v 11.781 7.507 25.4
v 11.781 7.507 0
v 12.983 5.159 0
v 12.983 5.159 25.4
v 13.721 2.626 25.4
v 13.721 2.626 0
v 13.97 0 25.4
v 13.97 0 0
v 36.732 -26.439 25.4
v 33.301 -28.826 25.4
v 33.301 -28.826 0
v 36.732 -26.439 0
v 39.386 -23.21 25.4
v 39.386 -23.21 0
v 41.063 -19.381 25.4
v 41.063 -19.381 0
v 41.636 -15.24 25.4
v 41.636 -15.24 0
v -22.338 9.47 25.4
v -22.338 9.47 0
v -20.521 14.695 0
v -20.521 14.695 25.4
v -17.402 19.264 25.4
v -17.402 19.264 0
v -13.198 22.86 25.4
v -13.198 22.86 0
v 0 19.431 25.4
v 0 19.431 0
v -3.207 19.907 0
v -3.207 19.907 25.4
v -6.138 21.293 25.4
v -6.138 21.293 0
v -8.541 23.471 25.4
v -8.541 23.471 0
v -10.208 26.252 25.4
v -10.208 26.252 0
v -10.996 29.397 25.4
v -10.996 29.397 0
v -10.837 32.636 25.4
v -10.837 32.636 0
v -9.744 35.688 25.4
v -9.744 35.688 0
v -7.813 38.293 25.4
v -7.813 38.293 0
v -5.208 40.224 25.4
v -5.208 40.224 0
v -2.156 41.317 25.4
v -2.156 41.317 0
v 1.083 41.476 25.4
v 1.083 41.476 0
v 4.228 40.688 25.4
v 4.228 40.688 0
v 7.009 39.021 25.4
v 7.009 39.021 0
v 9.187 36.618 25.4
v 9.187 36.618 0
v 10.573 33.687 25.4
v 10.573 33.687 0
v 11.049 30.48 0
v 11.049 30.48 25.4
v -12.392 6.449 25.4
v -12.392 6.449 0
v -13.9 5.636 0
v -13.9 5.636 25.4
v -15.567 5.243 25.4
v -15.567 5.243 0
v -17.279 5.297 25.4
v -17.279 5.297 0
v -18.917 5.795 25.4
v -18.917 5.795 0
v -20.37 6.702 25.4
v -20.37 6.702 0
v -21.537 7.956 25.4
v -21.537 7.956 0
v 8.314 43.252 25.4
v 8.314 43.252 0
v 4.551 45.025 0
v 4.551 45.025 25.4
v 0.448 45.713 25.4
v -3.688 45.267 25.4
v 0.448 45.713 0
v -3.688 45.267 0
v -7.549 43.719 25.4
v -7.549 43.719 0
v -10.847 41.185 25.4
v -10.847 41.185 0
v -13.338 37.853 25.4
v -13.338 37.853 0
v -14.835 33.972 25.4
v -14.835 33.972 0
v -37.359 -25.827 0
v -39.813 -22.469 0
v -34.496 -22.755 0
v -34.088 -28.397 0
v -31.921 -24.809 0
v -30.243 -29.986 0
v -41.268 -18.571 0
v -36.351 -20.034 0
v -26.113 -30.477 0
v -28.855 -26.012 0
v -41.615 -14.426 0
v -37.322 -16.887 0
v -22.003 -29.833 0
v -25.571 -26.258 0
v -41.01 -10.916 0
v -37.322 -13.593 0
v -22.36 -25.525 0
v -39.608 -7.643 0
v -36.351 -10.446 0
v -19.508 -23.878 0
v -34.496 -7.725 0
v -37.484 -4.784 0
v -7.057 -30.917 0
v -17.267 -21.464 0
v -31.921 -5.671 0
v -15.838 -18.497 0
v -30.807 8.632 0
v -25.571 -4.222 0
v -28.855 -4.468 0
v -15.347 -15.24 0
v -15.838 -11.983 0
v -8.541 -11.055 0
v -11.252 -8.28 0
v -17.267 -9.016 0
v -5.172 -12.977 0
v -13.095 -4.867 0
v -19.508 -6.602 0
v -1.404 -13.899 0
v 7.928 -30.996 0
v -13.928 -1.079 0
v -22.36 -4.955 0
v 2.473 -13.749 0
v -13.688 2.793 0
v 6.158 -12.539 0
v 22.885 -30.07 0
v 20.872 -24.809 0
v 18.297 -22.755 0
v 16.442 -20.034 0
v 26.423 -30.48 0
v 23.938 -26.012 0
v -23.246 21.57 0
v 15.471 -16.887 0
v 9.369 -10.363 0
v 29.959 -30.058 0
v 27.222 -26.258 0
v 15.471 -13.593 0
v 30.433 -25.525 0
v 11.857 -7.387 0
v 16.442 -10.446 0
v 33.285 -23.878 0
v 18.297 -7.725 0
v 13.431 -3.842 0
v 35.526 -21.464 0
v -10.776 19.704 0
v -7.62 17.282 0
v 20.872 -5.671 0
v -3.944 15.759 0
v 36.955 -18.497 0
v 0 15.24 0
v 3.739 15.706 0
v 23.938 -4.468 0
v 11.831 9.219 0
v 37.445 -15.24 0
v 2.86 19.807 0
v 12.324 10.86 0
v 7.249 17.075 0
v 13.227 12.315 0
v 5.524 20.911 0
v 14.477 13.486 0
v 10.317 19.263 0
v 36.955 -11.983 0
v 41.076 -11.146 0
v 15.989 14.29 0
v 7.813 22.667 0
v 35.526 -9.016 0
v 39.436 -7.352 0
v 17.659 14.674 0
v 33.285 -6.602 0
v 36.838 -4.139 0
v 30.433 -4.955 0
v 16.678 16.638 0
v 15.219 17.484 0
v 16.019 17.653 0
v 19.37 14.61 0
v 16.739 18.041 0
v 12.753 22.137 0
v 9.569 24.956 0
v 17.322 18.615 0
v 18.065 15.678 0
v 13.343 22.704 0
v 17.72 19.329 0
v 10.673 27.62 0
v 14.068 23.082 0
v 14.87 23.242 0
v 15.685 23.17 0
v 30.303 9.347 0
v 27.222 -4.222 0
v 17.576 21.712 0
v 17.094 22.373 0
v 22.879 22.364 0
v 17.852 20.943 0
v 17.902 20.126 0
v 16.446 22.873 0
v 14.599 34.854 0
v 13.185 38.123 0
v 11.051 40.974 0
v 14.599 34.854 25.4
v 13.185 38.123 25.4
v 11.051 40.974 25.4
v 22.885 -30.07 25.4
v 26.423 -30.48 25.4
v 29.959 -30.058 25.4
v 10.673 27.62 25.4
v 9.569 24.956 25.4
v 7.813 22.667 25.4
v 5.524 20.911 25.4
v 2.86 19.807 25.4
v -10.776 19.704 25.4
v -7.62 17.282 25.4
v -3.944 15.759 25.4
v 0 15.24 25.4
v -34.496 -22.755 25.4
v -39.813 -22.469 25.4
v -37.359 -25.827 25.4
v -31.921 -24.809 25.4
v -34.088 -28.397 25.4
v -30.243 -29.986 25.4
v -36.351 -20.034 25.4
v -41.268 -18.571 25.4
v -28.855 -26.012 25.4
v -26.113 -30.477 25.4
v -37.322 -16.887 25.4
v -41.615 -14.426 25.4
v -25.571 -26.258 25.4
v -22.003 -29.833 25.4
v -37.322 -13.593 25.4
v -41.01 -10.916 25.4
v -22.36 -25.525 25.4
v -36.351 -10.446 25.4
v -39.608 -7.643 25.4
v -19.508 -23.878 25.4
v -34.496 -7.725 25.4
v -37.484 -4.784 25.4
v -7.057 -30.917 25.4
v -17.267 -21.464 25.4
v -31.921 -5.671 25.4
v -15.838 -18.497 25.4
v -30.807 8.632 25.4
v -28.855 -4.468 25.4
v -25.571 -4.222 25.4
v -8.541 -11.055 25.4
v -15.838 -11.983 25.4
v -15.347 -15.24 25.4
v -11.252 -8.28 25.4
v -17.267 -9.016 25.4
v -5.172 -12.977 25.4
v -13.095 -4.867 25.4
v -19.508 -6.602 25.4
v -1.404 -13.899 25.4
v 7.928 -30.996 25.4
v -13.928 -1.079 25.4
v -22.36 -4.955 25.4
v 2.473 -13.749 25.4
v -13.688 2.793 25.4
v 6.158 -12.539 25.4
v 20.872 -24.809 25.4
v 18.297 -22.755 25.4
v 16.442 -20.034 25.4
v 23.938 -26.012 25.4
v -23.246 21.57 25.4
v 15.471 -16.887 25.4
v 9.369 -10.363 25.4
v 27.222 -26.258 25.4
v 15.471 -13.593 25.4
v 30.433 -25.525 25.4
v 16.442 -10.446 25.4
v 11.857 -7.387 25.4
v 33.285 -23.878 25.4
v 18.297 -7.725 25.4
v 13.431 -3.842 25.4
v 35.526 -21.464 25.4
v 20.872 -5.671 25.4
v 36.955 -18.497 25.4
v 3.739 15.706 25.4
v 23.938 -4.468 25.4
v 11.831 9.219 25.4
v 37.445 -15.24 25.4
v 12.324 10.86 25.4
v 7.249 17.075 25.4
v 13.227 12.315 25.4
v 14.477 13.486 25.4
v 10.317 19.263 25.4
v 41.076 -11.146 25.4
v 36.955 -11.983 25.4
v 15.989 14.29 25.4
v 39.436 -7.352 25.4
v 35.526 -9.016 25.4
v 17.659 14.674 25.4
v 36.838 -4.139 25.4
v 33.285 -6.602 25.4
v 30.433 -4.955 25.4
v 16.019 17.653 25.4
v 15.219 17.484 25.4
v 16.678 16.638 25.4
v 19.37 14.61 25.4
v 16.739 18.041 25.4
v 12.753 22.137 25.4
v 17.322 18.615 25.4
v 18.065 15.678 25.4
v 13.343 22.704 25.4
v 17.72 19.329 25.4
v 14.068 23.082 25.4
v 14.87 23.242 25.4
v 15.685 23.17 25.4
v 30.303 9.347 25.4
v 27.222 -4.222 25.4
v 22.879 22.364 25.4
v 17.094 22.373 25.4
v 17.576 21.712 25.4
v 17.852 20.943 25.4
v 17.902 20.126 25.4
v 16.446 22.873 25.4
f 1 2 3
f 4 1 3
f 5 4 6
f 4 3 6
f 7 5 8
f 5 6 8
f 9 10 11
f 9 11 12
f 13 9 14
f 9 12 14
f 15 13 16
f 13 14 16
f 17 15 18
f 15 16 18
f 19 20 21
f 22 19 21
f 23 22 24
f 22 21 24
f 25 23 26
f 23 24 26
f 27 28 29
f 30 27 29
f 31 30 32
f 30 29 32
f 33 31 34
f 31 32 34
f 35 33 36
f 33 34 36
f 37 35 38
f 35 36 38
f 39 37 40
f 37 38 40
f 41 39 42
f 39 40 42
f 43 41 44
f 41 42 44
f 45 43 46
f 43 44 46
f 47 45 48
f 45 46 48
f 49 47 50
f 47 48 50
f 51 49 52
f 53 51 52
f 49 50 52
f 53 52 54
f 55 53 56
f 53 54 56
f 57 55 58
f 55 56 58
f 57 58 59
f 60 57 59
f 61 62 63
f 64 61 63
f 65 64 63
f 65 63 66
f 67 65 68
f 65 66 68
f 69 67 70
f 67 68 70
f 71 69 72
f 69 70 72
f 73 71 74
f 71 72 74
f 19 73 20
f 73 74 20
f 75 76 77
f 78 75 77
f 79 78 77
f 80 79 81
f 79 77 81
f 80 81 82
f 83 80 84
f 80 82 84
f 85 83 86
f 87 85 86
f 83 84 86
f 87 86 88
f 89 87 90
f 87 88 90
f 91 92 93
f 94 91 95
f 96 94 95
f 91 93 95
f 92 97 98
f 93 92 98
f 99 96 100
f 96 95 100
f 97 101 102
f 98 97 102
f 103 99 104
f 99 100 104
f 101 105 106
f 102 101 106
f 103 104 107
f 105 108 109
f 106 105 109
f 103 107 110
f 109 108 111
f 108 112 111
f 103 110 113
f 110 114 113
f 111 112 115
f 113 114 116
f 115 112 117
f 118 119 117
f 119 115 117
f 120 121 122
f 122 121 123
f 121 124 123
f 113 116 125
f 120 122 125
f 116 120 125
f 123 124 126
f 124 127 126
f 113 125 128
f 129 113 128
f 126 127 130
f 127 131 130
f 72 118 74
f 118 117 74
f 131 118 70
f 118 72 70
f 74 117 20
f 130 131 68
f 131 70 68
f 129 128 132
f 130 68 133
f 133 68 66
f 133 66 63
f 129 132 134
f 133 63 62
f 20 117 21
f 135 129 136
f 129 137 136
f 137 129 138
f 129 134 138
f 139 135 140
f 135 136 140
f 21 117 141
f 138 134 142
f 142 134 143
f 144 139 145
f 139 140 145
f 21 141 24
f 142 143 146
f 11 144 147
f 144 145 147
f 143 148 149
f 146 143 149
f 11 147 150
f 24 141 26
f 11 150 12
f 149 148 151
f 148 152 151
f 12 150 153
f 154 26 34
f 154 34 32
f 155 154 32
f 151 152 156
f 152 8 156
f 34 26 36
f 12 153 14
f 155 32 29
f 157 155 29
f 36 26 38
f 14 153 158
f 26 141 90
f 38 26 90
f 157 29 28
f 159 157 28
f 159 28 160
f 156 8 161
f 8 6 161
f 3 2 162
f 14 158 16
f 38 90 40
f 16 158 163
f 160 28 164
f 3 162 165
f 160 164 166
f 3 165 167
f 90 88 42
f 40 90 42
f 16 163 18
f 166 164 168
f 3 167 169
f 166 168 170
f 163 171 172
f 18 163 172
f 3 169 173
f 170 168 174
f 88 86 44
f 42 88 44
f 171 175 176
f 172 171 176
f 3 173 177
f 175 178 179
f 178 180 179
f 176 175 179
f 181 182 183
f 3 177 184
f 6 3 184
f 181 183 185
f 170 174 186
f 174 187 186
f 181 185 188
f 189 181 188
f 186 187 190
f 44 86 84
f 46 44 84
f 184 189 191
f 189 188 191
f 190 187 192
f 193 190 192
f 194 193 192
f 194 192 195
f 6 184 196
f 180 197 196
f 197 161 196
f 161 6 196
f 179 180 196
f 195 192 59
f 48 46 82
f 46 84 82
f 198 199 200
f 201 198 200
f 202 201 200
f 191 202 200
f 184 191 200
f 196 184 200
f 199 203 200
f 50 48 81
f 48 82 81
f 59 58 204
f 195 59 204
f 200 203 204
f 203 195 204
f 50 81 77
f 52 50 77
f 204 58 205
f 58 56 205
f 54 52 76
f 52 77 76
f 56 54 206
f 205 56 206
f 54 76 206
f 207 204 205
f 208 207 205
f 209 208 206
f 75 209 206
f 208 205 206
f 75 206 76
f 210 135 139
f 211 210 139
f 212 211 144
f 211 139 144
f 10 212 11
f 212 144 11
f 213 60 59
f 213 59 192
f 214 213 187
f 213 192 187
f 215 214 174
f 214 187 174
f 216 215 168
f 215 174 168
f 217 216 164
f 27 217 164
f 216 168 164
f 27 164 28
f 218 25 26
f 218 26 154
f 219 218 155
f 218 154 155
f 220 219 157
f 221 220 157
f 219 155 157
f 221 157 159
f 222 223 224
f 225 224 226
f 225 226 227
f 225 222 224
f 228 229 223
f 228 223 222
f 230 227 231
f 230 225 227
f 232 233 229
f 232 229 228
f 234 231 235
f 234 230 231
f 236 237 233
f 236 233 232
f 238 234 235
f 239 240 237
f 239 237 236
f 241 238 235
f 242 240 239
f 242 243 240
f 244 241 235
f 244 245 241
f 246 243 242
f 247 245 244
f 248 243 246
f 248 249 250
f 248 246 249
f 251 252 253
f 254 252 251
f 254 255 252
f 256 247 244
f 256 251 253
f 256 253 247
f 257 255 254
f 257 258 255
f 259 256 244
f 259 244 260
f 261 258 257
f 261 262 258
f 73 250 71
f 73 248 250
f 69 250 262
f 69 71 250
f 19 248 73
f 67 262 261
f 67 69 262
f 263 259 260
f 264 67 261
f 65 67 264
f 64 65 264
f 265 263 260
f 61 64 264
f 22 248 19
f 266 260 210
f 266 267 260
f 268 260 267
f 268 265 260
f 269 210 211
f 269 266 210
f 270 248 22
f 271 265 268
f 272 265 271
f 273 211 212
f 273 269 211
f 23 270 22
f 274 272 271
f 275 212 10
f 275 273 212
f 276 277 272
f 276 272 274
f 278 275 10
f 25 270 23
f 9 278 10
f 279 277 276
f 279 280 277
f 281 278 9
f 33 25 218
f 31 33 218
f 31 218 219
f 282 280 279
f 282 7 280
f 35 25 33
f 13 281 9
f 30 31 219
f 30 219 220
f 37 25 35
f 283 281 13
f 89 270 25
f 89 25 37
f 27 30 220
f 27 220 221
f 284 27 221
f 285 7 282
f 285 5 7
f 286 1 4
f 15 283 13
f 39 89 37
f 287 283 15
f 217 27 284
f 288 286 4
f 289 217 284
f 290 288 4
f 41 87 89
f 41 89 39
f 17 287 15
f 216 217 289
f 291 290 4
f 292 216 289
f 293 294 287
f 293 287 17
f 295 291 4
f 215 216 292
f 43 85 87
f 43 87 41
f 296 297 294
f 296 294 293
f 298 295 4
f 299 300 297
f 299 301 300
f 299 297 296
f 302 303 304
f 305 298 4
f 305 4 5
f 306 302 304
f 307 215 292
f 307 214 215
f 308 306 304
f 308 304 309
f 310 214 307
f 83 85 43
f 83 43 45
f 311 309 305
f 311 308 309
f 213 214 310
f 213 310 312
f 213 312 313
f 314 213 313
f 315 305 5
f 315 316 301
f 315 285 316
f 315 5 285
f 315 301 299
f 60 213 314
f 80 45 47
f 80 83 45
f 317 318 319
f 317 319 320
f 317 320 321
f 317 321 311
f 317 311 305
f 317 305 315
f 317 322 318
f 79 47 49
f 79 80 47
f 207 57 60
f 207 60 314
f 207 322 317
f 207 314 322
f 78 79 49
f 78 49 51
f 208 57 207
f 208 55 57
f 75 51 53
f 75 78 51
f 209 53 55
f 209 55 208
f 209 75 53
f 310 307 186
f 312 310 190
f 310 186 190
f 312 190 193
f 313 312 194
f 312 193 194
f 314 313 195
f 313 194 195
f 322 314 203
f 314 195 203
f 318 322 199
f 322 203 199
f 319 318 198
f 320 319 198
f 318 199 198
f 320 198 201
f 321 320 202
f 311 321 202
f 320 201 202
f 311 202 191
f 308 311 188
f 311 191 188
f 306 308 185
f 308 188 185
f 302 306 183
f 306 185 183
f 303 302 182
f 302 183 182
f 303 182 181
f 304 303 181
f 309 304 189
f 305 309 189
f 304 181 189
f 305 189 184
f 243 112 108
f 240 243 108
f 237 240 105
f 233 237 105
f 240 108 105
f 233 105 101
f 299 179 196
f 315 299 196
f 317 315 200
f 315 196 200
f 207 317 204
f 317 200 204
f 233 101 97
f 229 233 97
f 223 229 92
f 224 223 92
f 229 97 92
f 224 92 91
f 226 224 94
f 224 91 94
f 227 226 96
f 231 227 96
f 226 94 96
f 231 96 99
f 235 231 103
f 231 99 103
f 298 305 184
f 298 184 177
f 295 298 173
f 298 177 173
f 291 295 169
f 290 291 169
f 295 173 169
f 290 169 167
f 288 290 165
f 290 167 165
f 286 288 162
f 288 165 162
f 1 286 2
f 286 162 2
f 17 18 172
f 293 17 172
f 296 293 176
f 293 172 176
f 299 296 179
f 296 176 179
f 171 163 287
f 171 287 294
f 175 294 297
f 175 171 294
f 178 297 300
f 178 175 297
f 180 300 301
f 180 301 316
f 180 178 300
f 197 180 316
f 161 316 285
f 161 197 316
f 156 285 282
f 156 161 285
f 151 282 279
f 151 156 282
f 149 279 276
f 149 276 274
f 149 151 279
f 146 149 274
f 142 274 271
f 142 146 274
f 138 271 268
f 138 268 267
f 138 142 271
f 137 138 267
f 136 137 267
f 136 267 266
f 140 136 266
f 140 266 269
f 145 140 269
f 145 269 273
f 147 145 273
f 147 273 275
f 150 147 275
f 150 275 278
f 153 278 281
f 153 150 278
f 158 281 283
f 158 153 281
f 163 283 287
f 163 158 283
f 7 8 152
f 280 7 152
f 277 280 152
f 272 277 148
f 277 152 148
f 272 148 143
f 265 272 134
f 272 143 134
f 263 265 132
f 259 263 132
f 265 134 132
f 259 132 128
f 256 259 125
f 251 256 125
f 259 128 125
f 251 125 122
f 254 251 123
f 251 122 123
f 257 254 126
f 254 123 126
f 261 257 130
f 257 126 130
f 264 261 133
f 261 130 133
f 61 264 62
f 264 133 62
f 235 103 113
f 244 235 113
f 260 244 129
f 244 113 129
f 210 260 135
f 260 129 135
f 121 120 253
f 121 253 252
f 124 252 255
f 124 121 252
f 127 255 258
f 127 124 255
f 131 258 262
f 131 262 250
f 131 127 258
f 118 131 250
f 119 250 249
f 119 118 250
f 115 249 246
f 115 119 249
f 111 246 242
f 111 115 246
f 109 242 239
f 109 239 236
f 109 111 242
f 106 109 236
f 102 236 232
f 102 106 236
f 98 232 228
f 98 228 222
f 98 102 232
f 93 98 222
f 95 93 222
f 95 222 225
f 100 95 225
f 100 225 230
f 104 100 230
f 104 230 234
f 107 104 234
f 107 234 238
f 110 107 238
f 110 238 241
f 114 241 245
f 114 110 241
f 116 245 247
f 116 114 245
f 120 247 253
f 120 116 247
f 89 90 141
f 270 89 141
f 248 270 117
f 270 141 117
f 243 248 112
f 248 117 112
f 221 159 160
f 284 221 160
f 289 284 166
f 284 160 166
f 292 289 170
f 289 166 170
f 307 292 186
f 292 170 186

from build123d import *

# Parameters (mm, degrees)
F0_R     = 11.049
F1_DEPTH = 25.4
F2_DEPTH = 25.4


with BuildPart() as f1:
    # F0 (on Top) → F1 (new body)
    with BuildSketch(Plane.XY):
        with BuildLine():
            ThreePointArc((11.7814514995, 7.5072165658), (13.4117071517, 3.9098607745), (13.97, 0))
            ThreePointArc((13.97, 0), (-3.3198148199, -13.5698094888), (-12.3921660074, 6.4494280091))
            ThreePointArc((-12.3921660074, 6.4494280091), (-18.1144161616, 5.491925307), (-22.3375658393, 9.4701114579))
            ThreePointArc((-22.3375658393, 9.4701114579), (-19.1125242771, 17.0828384763), (-13.1982271537, 22.86))
            ThreePointArc((-13.1982271537, 22.86), (-15.0773857713, 28.2596310433), (-14.8345973958, 33.9717502926))
            ThreePointArc((-14.8345973958, 33.9717502926), (-27.1350680748, 15.1641790656), (-37.4838164006, -4.7839968529))
            ThreePointArc((-37.4838164006, -4.7839968529), (-20.7712342362, -1.076155213), (-11.1564543073, -15.24))
            ThreePointArc((-11.1564543073, -15.24), (-14.1650946399, -24.3312837754), (-22.0031000665, -29.8330133459))
            ThreePointArc((-22.0031000665, -29.8330133459), (0.4349697391, -31.081747819), (22.8849710065, -30.0699388073))
            ThreePointArc((22.8849710065, -30.0699388073), (11.2593167407, -13.4723274374), (26.3964543073, 0))
            ThreePointArc((26.3964543073, 0), (24.3504342278, 8.0105123163), (19.3701400189, 14.6098437466))
            ThreePointArc((19.3701400189, 14.6098437466), (13.8133549124, 12.9415819171), (11.7814514995, 7.5072165658))
        make_face()
        with BuildLine():
            ThreePointArc((15.2189978183, 17.4838557876), (17.3812836494, 16.1720980867), (19.3701400189, 14.6098437466))
            ThreePointArc((19.3701400189, 14.6098437466), (24.3504342278, 8.0105123163), (26.3964543073, 0))
            ThreePointArc((26.3964543073, 0), (32.0122512707, -1.0724164211), (36.8376974623, -4.1387369467))
            ThreePointArc((36.8376974623, -4.1387369467), (26.7000983357, 15.9175687534), (14.5988453941, 34.8539356602))
            ThreePointArc((14.5988453941, 34.8539356602), (15.0788594364, 32.69033891), (15.24, 30.48))
            ThreePointArc((15.24, 30.48), (14.6051180743, 26.1270554752), (12.7533692867, 22.1367888773))
            ThreePointArc((12.7533692867, 22.1367888773), (17.57558266, 21.7123752268), (15.2189978183, 17.4838557876))
        make_face()
        with BuildLine():
            ThreePointArc((-13.1982271537, 22.86), (-7.62, 17.2817728463), (0, 15.24))
            ThreePointArc((0, 15.24), (7.2493814388, 17.074625378), (12.7533692867, 22.1367888773))
            ThreePointArc((12.7533692867, 22.1367888773), (14.6051180743, 26.1270554752), (15.24, 30.48))
            ThreePointArc((15.24, 30.48), (15.0788594364, 32.69033891), (14.5988453941, 34.8539356602))
            ThreePointArc((14.5988453941, 34.8539356602), (11.505690551, 39.090096987), (8.3139361742, 43.2524729513))
            ThreePointArc((8.3139361742, 43.2524729513), (-5.6712175905, 44.6254901308), (-14.8345973958, 33.9717502926))
            ThreePointArc((-14.8345973958, 33.9717502926), (-15.0773857713, 28.2596310433), (-13.1982271537, 22.86))
        make_face()
        with BuildLine():
            ThreePointArc((11.049, 30.48), (7.8128228253, 22.6671771747), (0, 19.431))
            ThreePointArc((0, 19.431), (-7.8128228253, 38.2928228253), (11.049, 30.48))
        make_face(mode=Mode.SUBTRACT)
        with BuildLine():
            ThreePointArc((36.8376974623, -4.1387369467), (32.0122512707, -1.0724164211), (26.3964543073, 0))
            ThreePointArc((26.3964543073, 0), (11.2593167407, -13.4723274374), (22.8849710065, -30.0699388073))
            ThreePointArc((22.8849710065, -30.0699388073), (28.1001717516, -29.5092687987), (33.3007722652, -28.8263164079))
            ThreePointArc((33.3007722652, -28.8263164079), (39.3864390202, -23.2098116139), (41.6364543073, -15.24))
            ThreePointArc((41.6364543073, -15.24), (40.3854168436, -9.1929736928), (36.8376974623, -4.1387369467))
        make_face()
        with Locations((26.3964543073, -15.24)):
            Circle(F0_R, mode=Mode.SUBTRACT)
        with BuildLine():
            ThreePointArc((33.3007722652, -28.8263164079), (28.1001717516, -29.5092687987), (22.8849710065, -30.0699388073))
            ThreePointArc((22.8849710065, -30.0699388073), (28.2032417659, -30.3725185967), (33.3007722652, -28.8263164079))
        make_face()
        with BuildLine():
            ThreePointArc((8.3139361742, 43.2524729513), (11.505690551, 39.090096987), (14.5988453941, 34.8539356602))
            ThreePointArc((14.5988453941, 34.8539356602), (12.2017517987, 39.6109831367), (8.3139361742, 43.2524729513))
        make_face()
        with BuildLine():
            ThreePointArc((-41.6147084394, -14.4261565433), (-35.8111993144, -27.2241635692), (-22.0031000665, -29.8330133459))
            ThreePointArc((-22.0031000665, -29.8330133459), (-14.1650946399, -24.3312837754), (-11.1564543073, -15.24))
            ThreePointArc((-11.1564543073, -15.24), (-20.7712342362, -1.076155213), (-37.4838164006, -4.7839968529))
            ThreePointArc((-37.4838164006, -4.7839968529), (-39.6058623026, -9.5808281882), (-41.6147084394, -14.4261565433))
        make_face()
        with Locations((-26.3964543073, -15.24)):
            Circle(F0_R, mode=Mode.SUBTRACT)
        with BuildLine():
            ThreePointArc((-41.6147084394, -14.4261565433), (-39.6058623026, -9.5808281882), (-37.4838164006, -4.7839968529))
            ThreePointArc((-37.4838164006, -4.7839968529), (-40.4049935646, -9.23846454), (-41.6147084394, -14.4261565433))
        make_face()
    extrude(amount=F1_DEPTH)

    # F0 (on Top) → F2 (join)
    with BuildSketch(Plane.XY):
        with BuildLine():
            ThreePointArc((11.7814514995, 7.5072165658), (13.4117071517, 3.9098607745), (13.97, 0))
            ThreePointArc((13.97, 0), (-3.3198148199, -13.5698094888), (-12.3921660074, 6.4494280091))
            ThreePointArc((-12.3921660074, 6.4494280091), (-18.1144161616, 5.491925307), (-22.3375658393, 9.4701114579))
            ThreePointArc((-22.3375658393, 9.4701114579), (-19.1125242771, 17.0828384763), (-13.1982271537, 22.86))
            ThreePointArc((-13.1982271537, 22.86), (-15.0773857713, 28.2596310433), (-14.8345973958, 33.9717502926))
            ThreePointArc((-14.8345973958, 33.9717502926), (-27.1350680748, 15.1641790656), (-37.4838164006, -4.7839968529))
            ThreePointArc((-37.4838164006, -4.7839968529), (-20.7712342362, -1.076155213), (-11.1564543073, -15.24))
            ThreePointArc((-11.1564543073, -15.24), (-14.1650946399, -24.3312837754), (-22.0031000665, -29.8330133459))
            ThreePointArc((-22.0031000665, -29.8330133459), (0.4349697391, -31.081747819), (22.8849710065, -30.0699388073))
            ThreePointArc((22.8849710065, -30.0699388073), (11.2593167407, -13.4723274374), (26.3964543073, 0))
            ThreePointArc((26.3964543073, 0), (24.3504342278, 8.0105123163), (19.3701400189, 14.6098437466))
            ThreePointArc((19.3701400189, 14.6098437466), (13.8133549124, 12.9415819171), (11.7814514995, 7.5072165658))
        make_face()
        with BuildLine():
            ThreePointArc((15.2189978183, 17.4838557876), (17.3812836494, 16.1720980867), (19.3701400189, 14.6098437466))
            ThreePointArc((19.3701400189, 14.6098437466), (24.3504342278, 8.0105123163), (26.3964543073, 0))
            ThreePointArc((26.3964543073, 0), (32.0122512707, -1.0724164211), (36.8376974623, -4.1387369467))
            ThreePointArc((36.8376974623, -4.1387369467), (26.7000983357, 15.9175687534), (14.5988453941, 34.8539356602))
            ThreePointArc((14.5988453941, 34.8539356602), (15.0788594364, 32.69033891), (15.24, 30.48))
            ThreePointArc((15.24, 30.48), (14.6051180743, 26.1270554752), (12.7533692867, 22.1367888773))
            ThreePointArc((12.7533692867, 22.1367888773), (17.57558266, 21.7123752268), (15.2189978183, 17.4838557876))
        make_face()
        with BuildLine():
            ThreePointArc((-13.1982271537, 22.86), (-7.62, 17.2817728463), (0, 15.24))
            ThreePointArc((0, 15.24), (7.2493814388, 17.074625378), (12.7533692867, 22.1367888773))
            ThreePointArc((12.7533692867, 22.1367888773), (14.6051180743, 26.1270554752), (15.24, 30.48))
            ThreePointArc((15.24, 30.48), (15.0788594364, 32.69033891), (14.5988453941, 34.8539356602))
            ThreePointArc((14.5988453941, 34.8539356602), (11.505690551, 39.090096987), (8.3139361742, 43.2524729513))
            ThreePointArc((8.3139361742, 43.2524729513), (-5.6712175905, 44.6254901308), (-14.8345973958, 33.9717502926))
            ThreePointArc((-14.8345973958, 33.9717502926), (-15.0773857713, 28.2596310433), (-13.1982271537, 22.86))
        make_face()
        with BuildLine():
            ThreePointArc((11.049, 30.48), (7.8128228253, 22.6671771747), (0, 19.431))
            ThreePointArc((0, 19.431), (-7.8128228253, 38.2928228253), (11.049, 30.48))
        make_face(mode=Mode.SUBTRACT)
        with BuildLine():
            ThreePointArc((36.8376974623, -4.1387369467), (32.0122512707, -1.0724164211), (26.3964543073, 0))
            ThreePointArc((26.3964543073, 0), (11.2593167407, -13.4723274374), (22.8849710065, -30.0699388073))
            ThreePointArc((22.8849710065, -30.0699388073), (28.1001717516, -29.5092687987), (33.3007722652, -28.8263164079))
            ThreePointArc((33.3007722652, -28.8263164079), (39.3864390202, -23.2098116139), (41.6364543073, -15.24))
            ThreePointArc((41.6364543073, -15.24), (40.3854168436, -9.1929736928), (36.8376974623, -4.1387369467))
        make_face()
        with Locations((26.3964543073, -15.24)):
            Circle(F0_R, mode=Mode.SUBTRACT)
        with BuildLine():
            ThreePointArc((33.3007722652, -28.8263164079), (28.1001717516, -29.5092687987), (22.8849710065, -30.0699388073))
            ThreePointArc((22.8849710065, -30.0699388073), (28.2032417659, -30.3725185967), (33.3007722652, -28.8263164079))
        make_face()
        with BuildLine():
            ThreePointArc((8.3139361742, 43.2524729513), (11.505690551, 39.090096987), (14.5988453941, 34.8539356602))
            ThreePointArc((14.5988453941, 34.8539356602), (12.2017517987, 39.6109831367), (8.3139361742, 43.2524729513))
        make_face()
        with BuildLine():
            ThreePointArc((-41.6147084394, -14.4261565433), (-35.8111993144, -27.2241635692), (-22.0031000665, -29.8330133459))
            ThreePointArc((-22.0031000665, -29.8330133459), (-14.1650946399, -24.3312837754), (-11.1564543073, -15.24))
            ThreePointArc((-11.1564543073, -15.24), (-20.7712342362, -1.076155213), (-37.4838164006, -4.7839968529))
            ThreePointArc((-37.4838164006, -4.7839968529), (-39.6058623026, -9.5808281882), (-41.6147084394, -14.4261565433))
        make_face()
        with Locations((-26.3964543073, -15.24)):
            Circle(F0_R, mode=Mode.SUBTRACT)
        with BuildLine():
            ThreePointArc((-41.6147084394, -14.4261565433), (-39.6058623026, -9.5808281882), (-37.4838164006, -4.7839968529))
            ThreePointArc((-37.4838164006, -4.7839968529), (-40.4049935646, -9.23846454), (-41.6147084394, -14.4261565433))
        make_face()
    extrude(amount=F2_DEPTH)


solid = f1.part
